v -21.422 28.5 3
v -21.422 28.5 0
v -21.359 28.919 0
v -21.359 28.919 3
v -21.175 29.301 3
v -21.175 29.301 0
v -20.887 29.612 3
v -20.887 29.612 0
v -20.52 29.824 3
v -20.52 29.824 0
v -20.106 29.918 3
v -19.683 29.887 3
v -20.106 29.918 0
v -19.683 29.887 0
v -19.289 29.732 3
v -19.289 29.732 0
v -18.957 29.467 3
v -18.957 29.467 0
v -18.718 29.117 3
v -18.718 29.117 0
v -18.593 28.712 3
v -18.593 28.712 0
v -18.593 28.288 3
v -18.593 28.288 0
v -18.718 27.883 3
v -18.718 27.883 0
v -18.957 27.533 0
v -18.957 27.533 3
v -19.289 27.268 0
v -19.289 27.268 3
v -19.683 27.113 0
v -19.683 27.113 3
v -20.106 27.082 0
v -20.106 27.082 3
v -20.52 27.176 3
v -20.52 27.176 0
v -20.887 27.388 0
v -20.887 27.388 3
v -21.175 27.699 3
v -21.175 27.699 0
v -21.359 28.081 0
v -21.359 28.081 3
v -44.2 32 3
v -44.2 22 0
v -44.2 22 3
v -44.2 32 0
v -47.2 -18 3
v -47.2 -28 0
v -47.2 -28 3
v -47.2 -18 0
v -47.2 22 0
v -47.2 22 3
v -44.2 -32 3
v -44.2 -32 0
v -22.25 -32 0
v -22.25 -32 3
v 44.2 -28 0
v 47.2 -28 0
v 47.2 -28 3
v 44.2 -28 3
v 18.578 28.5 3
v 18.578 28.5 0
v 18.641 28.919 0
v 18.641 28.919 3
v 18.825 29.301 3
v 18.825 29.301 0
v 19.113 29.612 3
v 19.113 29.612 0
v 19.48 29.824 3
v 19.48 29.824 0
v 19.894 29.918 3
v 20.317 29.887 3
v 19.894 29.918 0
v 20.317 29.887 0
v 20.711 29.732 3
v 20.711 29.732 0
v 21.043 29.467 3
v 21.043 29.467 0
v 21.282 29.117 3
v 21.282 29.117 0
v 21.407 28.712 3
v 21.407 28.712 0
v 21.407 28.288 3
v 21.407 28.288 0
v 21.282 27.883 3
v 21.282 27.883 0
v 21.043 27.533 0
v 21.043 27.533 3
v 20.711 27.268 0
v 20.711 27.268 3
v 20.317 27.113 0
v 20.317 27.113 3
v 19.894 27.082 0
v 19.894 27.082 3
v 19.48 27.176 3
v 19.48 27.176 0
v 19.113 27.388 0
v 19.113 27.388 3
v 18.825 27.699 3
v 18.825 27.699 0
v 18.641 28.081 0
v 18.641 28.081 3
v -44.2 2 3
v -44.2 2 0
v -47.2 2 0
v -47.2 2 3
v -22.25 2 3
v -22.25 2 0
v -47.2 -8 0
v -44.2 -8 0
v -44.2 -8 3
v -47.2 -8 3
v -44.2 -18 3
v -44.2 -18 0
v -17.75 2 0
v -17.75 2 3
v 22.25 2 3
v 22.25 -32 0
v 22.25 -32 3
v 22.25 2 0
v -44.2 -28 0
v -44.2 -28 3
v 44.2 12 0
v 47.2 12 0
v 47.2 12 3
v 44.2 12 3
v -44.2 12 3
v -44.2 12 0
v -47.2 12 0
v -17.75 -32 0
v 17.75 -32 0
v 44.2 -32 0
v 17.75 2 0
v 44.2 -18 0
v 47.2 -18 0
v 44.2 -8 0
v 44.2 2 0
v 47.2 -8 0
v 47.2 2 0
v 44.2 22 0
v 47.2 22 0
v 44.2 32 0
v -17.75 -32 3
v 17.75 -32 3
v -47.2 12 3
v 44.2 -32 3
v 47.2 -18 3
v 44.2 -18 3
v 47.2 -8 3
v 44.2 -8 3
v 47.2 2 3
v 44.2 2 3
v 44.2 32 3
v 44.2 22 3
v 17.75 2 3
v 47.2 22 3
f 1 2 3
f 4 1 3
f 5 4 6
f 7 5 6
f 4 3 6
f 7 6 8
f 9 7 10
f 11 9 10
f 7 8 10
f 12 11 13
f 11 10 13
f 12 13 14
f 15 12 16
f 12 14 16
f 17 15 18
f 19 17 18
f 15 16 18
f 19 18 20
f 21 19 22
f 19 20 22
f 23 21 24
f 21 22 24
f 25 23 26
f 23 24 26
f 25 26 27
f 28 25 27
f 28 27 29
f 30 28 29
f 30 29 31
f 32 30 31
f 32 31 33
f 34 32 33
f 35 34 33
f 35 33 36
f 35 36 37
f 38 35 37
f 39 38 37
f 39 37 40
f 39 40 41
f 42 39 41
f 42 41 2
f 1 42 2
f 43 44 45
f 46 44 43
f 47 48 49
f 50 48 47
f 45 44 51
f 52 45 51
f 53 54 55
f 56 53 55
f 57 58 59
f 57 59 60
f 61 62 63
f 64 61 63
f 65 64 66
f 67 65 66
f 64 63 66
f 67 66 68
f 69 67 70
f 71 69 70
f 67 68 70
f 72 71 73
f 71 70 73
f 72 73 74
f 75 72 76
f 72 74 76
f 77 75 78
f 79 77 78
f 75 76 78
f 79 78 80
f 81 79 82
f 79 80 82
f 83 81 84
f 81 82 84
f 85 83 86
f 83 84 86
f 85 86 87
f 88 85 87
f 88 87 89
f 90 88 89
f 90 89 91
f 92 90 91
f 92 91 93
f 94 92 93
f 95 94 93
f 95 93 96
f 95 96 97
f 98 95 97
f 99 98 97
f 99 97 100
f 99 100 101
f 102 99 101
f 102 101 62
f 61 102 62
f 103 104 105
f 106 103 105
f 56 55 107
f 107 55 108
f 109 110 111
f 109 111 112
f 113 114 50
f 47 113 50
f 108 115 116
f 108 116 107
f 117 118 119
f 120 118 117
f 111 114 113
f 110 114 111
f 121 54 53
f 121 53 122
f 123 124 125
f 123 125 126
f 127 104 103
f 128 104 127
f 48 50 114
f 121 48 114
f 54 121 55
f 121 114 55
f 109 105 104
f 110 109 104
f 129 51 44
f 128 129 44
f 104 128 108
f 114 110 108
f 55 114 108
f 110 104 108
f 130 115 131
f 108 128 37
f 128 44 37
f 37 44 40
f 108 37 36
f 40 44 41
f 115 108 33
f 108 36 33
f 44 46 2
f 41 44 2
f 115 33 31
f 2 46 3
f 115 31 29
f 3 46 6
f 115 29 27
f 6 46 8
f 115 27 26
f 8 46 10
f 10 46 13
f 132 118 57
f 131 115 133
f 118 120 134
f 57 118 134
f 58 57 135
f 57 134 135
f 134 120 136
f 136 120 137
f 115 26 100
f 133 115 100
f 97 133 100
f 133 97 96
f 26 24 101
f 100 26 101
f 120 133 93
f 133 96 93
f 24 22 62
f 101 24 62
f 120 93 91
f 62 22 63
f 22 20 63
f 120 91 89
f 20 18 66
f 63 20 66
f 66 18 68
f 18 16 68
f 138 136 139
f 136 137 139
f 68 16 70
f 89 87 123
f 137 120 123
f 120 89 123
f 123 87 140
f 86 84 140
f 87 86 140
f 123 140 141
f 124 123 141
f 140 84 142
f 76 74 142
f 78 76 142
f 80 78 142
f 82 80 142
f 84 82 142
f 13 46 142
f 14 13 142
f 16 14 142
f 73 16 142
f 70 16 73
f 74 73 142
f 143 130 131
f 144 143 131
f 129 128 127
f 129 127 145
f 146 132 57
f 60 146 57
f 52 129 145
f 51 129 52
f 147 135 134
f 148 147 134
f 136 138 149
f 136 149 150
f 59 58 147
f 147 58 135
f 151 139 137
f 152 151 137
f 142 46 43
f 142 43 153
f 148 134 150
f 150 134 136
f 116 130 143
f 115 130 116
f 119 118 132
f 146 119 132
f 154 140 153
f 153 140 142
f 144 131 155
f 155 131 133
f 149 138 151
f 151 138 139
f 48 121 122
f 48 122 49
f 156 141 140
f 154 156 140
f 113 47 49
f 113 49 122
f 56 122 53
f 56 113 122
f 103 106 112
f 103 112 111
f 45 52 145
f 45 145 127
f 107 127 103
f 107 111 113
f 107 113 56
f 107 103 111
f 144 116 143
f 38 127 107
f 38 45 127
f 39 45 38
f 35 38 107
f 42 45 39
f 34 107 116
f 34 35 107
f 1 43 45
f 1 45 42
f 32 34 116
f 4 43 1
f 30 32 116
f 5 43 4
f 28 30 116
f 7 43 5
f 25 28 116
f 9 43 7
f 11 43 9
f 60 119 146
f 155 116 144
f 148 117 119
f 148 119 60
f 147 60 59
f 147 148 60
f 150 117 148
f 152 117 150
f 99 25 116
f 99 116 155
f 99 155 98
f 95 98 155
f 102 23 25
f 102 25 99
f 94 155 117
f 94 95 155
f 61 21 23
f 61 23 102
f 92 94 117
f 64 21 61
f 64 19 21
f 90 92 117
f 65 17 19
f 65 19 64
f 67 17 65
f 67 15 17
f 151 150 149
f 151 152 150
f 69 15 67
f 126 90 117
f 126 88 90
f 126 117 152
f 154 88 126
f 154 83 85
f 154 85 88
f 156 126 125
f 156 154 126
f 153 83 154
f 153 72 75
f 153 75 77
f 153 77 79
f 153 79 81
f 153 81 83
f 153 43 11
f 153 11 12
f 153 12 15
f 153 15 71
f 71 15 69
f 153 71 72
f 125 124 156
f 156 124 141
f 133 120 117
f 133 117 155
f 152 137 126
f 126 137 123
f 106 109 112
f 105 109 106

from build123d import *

# Parameters (mm, degrees)
SKETCH1_W           = 94.4
SKETCH1_H           = 64
BOSS_EXTRUDE1_DEPTH = 3
SKETCH2_W           = 3
SKETCH2_H           = 10
CUT_EXTRUDE1_DEPTH  = 3
SKETCH3_W           = 4.5
SKETCH3_H           = 34
CUT_EXTRUDE2_DEPTH  = 10
SKETCH4_R           = 1.4224
CUT_EXTRUDE3_DEPTH  = 6


with BuildPart() as part:
    # Sketch1 → Boss-Extrude1 (new body)
    with BuildSketch(Plane.XY):
        Rectangle(SKETCH1_W, SKETCH1_H)
    extrude(amount=BOSS_EXTRUDE1_DEPTH)

    # Sketch2 → Cut-Extrude1 (cut)
    with BuildSketch(Plane(origin=(0, 0, 0), x_dir=(-1, 0, 0), z_dir=(0, 0, -1))):
        with Locations((-45.7, 7)):
            Rectangle(SKETCH2_W, SKETCH2_H)
        with Locations((-45.7, 27)):
            Rectangle(SKETCH2_W, SKETCH2_H)
        with Locations((-45.7, -13)):
            Rectangle(SKETCH2_W, SKETCH2_H)
        with Locations((-45.7, -33)):
            Rectangle(SKETCH2_W, SKETCH2_H)
        with Locations((45.7, -33)):
            Rectangle(SKETCH2_W, SKETCH2_H)
        with Locations((45.7, -13)):
            Rectangle(SKETCH2_W, SKETCH2_H)
        with Locations((45.7, 7)):
            Rectangle(SKETCH2_W, SKETCH2_H)
        with Locations((45.7, 27)):
            Rectangle(SKETCH2_W, SKETCH2_H)
    extrude(amount=-CUT_EXTRUDE1_DEPTH, mode=Mode.SUBTRACT)

    # Sketch3 → Cut-Extrude2 (cut)
    with BuildSketch(Plane(origin=(0, 0, 0), x_dir=(-1, 0, 0), z_dir=(0, 0, -1))):
        with Locations((-20, -15)):
            Rectangle(SKETCH3_W, SKETCH3_H)
        with Locations((20, -15)):
            Rectangle(SKETCH3_W, SKETCH3_H)
    extrude(amount=-CUT_EXTRUDE2_DEPTH, mode=Mode.SUBTRACT)

    # Sketch4 → Cut-Extrude3 (cut)
    with BuildSketch(Plane(origin=(0, 0, 0), x_dir=(-1, 0, 0), z_dir=(0, 0, -1))):
        with Locations((-20, 28.5)):
            Circle(SKETCH4_R)
        with Locations((20, 28.5)):
            Circle(SKETCH4_R)
    extrude(amount=-CUT_EXTRUDE3_DEPTH, mode=Mode.SUBTRACT)


solid = part.part
